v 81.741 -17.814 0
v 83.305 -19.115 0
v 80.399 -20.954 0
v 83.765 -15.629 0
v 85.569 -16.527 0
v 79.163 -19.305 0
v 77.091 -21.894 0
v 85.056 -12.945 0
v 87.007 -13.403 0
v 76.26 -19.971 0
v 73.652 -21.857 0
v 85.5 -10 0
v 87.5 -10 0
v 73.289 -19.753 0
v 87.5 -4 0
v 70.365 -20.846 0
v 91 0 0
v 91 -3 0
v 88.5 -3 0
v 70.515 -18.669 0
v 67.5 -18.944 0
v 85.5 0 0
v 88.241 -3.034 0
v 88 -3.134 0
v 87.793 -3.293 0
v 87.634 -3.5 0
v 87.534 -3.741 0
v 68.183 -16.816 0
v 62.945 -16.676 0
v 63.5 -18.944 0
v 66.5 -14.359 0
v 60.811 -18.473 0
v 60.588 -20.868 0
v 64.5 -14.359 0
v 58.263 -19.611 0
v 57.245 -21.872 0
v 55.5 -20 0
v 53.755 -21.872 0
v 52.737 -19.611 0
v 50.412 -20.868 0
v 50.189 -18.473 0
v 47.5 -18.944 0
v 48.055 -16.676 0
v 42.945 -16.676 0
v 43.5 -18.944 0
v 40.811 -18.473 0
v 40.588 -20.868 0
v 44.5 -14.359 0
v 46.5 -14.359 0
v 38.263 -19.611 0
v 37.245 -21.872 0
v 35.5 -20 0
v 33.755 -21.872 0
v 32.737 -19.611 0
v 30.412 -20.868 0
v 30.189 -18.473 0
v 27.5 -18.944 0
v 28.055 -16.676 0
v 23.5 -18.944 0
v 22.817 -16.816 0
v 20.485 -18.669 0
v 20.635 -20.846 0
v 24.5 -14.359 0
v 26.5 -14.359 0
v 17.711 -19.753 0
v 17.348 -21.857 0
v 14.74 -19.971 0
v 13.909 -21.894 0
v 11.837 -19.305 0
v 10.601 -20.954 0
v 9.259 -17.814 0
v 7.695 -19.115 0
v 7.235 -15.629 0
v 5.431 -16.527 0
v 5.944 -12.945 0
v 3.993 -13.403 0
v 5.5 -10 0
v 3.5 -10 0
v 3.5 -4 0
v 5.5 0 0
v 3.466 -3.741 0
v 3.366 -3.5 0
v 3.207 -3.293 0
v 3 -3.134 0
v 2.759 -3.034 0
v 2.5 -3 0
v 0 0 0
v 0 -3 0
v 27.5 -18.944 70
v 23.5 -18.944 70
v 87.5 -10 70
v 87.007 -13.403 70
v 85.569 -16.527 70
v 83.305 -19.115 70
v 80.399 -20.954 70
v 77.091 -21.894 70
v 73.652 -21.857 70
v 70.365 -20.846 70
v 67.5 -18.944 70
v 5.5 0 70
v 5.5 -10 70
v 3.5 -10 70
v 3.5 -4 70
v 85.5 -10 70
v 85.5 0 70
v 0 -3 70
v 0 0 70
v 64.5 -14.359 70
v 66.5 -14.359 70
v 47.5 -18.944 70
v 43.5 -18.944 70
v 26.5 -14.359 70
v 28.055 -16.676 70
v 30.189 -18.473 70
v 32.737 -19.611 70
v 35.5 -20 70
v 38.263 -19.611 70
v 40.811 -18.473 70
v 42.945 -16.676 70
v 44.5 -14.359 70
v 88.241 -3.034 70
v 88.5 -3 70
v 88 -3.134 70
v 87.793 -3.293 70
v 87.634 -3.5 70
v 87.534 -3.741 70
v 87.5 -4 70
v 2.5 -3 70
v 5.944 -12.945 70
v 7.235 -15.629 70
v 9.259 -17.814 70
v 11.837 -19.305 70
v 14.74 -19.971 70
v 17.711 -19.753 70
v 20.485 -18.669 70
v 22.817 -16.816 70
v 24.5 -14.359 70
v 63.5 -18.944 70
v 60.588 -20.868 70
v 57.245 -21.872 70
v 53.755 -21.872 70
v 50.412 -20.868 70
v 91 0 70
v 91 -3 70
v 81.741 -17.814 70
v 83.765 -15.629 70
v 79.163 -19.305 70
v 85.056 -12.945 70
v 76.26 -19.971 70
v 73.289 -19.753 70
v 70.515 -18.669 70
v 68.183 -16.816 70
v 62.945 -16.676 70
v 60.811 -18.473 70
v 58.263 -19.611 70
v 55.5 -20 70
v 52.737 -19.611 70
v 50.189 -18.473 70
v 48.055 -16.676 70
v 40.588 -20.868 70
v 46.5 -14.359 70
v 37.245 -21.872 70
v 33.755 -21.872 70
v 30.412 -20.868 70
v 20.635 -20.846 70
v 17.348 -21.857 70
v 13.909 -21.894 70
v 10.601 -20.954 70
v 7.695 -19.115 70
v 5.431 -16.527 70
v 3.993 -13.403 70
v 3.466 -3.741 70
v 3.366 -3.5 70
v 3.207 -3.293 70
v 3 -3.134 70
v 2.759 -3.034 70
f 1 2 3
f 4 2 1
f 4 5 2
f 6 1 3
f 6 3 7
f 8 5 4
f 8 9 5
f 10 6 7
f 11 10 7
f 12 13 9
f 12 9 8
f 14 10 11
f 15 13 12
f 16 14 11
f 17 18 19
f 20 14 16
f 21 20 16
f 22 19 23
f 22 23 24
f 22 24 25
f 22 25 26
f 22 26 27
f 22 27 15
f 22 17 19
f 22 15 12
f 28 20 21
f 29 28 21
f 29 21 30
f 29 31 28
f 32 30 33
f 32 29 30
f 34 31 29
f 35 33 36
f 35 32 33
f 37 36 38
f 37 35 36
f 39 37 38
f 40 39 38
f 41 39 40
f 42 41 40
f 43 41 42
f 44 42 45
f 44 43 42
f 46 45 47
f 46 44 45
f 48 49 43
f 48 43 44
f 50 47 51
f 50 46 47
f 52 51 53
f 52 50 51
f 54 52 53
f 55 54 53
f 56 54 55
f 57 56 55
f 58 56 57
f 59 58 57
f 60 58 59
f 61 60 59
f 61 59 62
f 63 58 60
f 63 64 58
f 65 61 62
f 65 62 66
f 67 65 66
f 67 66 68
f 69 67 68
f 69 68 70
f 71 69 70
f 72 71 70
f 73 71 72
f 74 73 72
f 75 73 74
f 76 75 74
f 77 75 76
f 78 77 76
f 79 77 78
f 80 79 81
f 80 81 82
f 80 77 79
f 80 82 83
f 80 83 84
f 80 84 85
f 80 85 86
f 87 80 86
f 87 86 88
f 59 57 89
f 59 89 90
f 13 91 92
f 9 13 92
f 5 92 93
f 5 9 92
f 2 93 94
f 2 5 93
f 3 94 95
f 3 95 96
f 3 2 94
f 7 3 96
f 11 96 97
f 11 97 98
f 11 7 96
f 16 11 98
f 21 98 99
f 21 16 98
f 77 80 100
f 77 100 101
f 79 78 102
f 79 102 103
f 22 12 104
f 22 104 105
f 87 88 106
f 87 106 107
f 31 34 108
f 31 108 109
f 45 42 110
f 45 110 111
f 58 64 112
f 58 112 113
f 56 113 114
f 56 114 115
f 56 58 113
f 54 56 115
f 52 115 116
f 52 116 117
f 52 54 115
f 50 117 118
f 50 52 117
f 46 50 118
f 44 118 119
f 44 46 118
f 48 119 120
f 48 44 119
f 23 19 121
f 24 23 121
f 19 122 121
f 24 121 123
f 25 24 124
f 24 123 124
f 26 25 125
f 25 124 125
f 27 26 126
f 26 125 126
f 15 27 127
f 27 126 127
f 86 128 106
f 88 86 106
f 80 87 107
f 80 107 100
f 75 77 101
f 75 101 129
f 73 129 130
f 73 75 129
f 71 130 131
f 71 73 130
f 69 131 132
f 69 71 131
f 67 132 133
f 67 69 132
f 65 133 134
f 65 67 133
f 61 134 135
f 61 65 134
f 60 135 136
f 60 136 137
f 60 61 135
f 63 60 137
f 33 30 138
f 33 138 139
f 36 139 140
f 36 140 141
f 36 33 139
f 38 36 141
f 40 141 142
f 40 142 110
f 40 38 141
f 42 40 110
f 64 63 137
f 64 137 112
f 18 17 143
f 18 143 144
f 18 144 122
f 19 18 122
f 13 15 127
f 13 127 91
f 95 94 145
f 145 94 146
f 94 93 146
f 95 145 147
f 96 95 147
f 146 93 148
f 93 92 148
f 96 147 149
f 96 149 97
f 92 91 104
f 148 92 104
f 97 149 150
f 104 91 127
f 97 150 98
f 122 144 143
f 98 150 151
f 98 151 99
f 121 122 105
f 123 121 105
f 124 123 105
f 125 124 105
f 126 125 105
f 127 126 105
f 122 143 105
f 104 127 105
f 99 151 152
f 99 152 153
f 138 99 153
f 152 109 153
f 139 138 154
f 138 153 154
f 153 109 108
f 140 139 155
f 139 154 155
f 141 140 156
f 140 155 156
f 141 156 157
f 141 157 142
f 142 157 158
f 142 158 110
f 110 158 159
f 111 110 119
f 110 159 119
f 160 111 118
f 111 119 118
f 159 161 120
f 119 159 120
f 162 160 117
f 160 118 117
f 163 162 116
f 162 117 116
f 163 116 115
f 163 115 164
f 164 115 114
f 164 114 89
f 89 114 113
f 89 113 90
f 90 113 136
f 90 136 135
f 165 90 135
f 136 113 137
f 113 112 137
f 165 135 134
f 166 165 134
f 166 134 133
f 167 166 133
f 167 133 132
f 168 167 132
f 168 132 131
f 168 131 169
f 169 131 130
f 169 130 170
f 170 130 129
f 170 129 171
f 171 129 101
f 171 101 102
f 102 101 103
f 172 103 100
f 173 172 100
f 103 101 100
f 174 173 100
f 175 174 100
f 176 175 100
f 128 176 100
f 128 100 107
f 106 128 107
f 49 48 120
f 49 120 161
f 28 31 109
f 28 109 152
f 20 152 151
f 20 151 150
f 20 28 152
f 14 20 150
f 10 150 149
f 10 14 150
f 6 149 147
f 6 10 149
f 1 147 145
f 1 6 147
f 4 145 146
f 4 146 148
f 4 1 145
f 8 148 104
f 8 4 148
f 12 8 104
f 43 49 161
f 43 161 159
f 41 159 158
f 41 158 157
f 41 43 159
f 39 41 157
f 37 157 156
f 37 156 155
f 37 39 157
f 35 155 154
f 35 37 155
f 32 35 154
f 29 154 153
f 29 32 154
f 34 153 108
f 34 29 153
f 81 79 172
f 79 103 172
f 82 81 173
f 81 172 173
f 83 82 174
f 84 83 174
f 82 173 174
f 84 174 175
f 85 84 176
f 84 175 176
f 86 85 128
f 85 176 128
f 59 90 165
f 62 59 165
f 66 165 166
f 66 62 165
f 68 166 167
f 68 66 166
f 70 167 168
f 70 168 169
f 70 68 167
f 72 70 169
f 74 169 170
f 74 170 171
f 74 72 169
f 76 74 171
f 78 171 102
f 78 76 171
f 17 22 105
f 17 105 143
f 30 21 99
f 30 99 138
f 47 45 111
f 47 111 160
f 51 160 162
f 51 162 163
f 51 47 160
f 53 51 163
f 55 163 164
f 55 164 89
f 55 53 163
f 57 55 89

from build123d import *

# Parameters (mm, degrees)
BOSS_EXTRUDE1_DEPTH = 70
FILLET2_R           = 1


with BuildPart() as part:
    # Sketch1 → Boss-Extrude1 (new body)
    with BuildSketch(Plane.XY):
        with BuildLine():
            Line((0, 0), (5.5, 0))
            Line((5.5, 0), (5.5, -10))
            ThreePointArc((5.5, -10), (13.263932023, -19.746794345), (24.5, -14.358898944))
            Line((24.5, -14.358898944), (26.5, -14.358898944))
            ThreePointArc((26.5, -14.358898944), (35.5, -20), (44.5, -14.358898944))
            Line((44.5, -14.358898944), (46.5, -14.358898944))
            ThreePointArc((46.5, -14.358898944), (55.5, -20), (64.5, -14.358898944))
            Line((64.5, -14.358898944), (66.5, -14.358898944))
            ThreePointArc((66.5, -14.358898944), (77.736067977, -19.746794345), (85.5, -10))
            Line((85.5, -10), (85.5, 0))
            Line((85.5, 0), (91, 0))
            Line((91, 0), (91, -3))
            Line((91, -3), (87.5, -3))
            Line((87.5, -3), (87.5, -10))
            ThreePointArc((87.5, -10), (80.398979486, -20.95445115), (67.5, -18.94427191))
            Line((67.5, -18.94427191), (63.5, -18.94427191))
            ThreePointArc((63.5, -18.94427191), (55.5, -22), (47.5, -18.94427191))
            Line((47.5, -18.94427191), (43.5, -18.94427191))
            ThreePointArc((43.5, -18.94427191), (35.5, -22), (27.5, -18.94427191))
            Line((27.5, -18.94427191), (23.5, -18.94427191))
            ThreePointArc((23.5, -18.94427191), (10.601020514, -20.95445115), (3.5, -10))
            Line((3.5, -10), (3.5, -3))
            Line((3.5, -3), (0, -3))
            Line((0, -3), (0, 0))
        make_face()
    extrude(amount=BOSS_EXTRUDE1_DEPTH)

    # Fillet2
    fillet2_edges = [part.edges().sort_by_distance(p)[0] for p in [
        (87.5, -3, 35),
        (3.5, -3, 35),
    ]]
    fillet(fillet2_edges, radius=FILLET2_R)


solid = part.part
